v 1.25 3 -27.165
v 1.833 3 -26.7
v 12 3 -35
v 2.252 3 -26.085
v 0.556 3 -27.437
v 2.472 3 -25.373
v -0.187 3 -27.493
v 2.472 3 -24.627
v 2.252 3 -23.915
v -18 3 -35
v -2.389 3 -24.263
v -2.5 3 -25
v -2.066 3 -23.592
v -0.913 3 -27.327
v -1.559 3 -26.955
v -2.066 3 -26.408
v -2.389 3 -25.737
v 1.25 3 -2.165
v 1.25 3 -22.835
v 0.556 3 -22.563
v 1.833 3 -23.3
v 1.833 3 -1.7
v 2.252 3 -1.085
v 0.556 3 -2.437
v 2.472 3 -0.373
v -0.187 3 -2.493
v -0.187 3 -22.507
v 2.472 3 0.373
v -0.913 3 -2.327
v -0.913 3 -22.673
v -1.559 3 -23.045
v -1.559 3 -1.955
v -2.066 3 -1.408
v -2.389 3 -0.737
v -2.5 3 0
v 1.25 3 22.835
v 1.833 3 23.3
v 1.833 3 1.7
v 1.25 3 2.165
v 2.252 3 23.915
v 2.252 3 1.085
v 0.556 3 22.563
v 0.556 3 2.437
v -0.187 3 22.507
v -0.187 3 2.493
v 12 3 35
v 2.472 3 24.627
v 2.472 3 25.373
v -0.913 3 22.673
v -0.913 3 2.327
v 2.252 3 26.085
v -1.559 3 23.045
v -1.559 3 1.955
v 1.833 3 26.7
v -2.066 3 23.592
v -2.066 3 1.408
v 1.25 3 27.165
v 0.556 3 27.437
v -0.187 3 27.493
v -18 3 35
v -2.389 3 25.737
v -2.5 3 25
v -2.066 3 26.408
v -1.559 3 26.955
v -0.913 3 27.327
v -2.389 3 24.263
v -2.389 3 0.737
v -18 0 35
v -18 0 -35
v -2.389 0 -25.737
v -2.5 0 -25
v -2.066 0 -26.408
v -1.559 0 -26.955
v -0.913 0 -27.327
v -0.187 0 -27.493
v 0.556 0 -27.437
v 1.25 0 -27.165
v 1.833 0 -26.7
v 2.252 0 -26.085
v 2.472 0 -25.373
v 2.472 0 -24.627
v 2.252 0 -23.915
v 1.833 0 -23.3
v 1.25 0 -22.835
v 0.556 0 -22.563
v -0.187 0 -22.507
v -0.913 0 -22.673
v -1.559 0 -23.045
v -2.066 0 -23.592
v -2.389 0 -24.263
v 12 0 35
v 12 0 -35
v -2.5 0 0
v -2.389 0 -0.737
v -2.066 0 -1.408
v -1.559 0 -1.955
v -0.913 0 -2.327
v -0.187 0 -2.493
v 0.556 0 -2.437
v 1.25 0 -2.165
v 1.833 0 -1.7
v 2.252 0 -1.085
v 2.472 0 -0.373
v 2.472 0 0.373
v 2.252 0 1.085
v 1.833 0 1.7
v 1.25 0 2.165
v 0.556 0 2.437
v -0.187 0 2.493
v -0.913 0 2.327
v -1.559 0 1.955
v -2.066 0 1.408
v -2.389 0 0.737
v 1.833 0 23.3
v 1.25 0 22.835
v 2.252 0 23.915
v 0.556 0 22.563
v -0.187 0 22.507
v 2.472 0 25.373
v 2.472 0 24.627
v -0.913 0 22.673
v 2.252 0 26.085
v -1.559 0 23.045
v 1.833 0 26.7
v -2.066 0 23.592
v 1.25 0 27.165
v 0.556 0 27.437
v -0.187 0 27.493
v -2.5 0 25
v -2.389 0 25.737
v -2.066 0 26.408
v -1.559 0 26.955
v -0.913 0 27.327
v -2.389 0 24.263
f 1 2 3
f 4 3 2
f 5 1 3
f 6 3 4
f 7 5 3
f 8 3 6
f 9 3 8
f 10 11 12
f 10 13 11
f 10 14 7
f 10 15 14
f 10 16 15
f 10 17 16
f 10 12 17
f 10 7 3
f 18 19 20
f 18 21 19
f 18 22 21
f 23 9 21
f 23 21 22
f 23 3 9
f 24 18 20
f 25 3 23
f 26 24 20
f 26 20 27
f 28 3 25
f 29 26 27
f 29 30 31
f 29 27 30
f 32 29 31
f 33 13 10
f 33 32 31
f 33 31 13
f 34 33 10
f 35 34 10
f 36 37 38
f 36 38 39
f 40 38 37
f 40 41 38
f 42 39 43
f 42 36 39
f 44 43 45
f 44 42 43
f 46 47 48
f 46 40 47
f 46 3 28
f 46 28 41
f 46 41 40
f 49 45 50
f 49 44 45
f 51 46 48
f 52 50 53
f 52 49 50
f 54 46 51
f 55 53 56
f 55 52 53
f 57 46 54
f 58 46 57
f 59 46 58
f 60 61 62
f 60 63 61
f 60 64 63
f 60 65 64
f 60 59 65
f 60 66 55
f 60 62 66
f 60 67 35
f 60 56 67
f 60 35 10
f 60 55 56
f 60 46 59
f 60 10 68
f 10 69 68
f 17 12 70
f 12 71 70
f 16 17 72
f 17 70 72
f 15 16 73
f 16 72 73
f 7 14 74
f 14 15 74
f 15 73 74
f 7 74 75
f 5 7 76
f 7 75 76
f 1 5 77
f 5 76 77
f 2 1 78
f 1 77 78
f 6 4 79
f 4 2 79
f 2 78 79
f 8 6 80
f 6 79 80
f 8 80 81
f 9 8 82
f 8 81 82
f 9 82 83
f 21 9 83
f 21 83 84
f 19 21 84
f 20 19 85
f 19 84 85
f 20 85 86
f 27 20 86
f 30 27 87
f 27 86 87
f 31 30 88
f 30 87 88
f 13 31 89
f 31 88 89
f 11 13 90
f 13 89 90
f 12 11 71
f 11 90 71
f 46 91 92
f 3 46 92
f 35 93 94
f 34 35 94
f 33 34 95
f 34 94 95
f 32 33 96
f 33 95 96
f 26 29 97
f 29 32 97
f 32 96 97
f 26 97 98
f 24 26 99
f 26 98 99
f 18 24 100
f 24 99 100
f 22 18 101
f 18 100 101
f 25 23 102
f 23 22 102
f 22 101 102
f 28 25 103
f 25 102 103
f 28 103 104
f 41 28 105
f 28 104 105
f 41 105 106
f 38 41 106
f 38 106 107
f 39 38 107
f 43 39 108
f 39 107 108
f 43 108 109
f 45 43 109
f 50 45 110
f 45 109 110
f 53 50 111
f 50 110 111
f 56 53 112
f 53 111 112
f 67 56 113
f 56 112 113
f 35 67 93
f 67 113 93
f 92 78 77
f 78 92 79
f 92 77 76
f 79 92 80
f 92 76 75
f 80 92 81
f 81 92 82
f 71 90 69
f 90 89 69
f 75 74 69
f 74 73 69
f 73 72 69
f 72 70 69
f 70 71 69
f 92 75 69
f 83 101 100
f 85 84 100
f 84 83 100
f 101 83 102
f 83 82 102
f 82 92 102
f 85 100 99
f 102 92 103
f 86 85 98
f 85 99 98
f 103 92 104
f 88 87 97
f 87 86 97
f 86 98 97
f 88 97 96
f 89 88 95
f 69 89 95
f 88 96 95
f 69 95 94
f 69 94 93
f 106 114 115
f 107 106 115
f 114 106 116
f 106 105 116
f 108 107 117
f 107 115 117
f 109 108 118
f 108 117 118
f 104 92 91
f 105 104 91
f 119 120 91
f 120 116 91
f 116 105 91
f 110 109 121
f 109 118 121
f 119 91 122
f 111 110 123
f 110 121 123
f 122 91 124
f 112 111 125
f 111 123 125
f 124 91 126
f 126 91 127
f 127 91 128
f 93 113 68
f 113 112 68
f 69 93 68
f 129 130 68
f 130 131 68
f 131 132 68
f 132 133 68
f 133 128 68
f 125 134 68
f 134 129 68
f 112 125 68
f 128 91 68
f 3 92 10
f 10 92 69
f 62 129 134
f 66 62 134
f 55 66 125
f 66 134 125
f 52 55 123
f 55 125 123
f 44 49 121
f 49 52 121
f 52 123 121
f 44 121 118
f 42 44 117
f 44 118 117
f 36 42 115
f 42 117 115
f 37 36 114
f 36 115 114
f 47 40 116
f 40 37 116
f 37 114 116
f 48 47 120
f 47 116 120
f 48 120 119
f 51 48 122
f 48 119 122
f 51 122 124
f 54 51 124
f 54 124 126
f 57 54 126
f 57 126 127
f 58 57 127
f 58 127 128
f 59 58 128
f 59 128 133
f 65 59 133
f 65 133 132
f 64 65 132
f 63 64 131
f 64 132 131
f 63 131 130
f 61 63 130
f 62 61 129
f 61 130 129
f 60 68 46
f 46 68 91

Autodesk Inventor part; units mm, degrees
ref_plane "YZ Plane" through (0, 0, 0) normal (1, 0, 0) x (0, 1, 0)
ref_plane "XZ Plane" through (0, 0, 0) normal (0, 1, 0) x (-1, 0, 0)
ref_plane "XY Plane" through (0, 0, 0) normal (0, 0, 1) x (1, 0, 0)
sketch "Sketch1" plane through (0, 0, 0) normal (0, 1, 0) x (-1, 0, 0)
  line L0 (18, 35) -> (-12, 35)
  line L1 (-12, 35) -> (-12, -35)
  line L2 (-12, -35) -> (18, -35)
  line L3 (18, -35) -> (18, 35)
  circle A0 centre (0, 0) radius 2.5
  circle A1 centre (0, -25) radius 2.5
  circle A2 centre (0, 25) radius 2.5
  dimension "d0" = 5
  dimension "d1" = 25
  dimension "d2" = 25
  dimension "d3" = 10
  dimension "d4" = 10
  dimension "d5" = 30
  dimension "d6" = 12
extrude "Extrusion1" add sketch "Sketch1" along normal blind 3
properties part number "testing_chunk"
